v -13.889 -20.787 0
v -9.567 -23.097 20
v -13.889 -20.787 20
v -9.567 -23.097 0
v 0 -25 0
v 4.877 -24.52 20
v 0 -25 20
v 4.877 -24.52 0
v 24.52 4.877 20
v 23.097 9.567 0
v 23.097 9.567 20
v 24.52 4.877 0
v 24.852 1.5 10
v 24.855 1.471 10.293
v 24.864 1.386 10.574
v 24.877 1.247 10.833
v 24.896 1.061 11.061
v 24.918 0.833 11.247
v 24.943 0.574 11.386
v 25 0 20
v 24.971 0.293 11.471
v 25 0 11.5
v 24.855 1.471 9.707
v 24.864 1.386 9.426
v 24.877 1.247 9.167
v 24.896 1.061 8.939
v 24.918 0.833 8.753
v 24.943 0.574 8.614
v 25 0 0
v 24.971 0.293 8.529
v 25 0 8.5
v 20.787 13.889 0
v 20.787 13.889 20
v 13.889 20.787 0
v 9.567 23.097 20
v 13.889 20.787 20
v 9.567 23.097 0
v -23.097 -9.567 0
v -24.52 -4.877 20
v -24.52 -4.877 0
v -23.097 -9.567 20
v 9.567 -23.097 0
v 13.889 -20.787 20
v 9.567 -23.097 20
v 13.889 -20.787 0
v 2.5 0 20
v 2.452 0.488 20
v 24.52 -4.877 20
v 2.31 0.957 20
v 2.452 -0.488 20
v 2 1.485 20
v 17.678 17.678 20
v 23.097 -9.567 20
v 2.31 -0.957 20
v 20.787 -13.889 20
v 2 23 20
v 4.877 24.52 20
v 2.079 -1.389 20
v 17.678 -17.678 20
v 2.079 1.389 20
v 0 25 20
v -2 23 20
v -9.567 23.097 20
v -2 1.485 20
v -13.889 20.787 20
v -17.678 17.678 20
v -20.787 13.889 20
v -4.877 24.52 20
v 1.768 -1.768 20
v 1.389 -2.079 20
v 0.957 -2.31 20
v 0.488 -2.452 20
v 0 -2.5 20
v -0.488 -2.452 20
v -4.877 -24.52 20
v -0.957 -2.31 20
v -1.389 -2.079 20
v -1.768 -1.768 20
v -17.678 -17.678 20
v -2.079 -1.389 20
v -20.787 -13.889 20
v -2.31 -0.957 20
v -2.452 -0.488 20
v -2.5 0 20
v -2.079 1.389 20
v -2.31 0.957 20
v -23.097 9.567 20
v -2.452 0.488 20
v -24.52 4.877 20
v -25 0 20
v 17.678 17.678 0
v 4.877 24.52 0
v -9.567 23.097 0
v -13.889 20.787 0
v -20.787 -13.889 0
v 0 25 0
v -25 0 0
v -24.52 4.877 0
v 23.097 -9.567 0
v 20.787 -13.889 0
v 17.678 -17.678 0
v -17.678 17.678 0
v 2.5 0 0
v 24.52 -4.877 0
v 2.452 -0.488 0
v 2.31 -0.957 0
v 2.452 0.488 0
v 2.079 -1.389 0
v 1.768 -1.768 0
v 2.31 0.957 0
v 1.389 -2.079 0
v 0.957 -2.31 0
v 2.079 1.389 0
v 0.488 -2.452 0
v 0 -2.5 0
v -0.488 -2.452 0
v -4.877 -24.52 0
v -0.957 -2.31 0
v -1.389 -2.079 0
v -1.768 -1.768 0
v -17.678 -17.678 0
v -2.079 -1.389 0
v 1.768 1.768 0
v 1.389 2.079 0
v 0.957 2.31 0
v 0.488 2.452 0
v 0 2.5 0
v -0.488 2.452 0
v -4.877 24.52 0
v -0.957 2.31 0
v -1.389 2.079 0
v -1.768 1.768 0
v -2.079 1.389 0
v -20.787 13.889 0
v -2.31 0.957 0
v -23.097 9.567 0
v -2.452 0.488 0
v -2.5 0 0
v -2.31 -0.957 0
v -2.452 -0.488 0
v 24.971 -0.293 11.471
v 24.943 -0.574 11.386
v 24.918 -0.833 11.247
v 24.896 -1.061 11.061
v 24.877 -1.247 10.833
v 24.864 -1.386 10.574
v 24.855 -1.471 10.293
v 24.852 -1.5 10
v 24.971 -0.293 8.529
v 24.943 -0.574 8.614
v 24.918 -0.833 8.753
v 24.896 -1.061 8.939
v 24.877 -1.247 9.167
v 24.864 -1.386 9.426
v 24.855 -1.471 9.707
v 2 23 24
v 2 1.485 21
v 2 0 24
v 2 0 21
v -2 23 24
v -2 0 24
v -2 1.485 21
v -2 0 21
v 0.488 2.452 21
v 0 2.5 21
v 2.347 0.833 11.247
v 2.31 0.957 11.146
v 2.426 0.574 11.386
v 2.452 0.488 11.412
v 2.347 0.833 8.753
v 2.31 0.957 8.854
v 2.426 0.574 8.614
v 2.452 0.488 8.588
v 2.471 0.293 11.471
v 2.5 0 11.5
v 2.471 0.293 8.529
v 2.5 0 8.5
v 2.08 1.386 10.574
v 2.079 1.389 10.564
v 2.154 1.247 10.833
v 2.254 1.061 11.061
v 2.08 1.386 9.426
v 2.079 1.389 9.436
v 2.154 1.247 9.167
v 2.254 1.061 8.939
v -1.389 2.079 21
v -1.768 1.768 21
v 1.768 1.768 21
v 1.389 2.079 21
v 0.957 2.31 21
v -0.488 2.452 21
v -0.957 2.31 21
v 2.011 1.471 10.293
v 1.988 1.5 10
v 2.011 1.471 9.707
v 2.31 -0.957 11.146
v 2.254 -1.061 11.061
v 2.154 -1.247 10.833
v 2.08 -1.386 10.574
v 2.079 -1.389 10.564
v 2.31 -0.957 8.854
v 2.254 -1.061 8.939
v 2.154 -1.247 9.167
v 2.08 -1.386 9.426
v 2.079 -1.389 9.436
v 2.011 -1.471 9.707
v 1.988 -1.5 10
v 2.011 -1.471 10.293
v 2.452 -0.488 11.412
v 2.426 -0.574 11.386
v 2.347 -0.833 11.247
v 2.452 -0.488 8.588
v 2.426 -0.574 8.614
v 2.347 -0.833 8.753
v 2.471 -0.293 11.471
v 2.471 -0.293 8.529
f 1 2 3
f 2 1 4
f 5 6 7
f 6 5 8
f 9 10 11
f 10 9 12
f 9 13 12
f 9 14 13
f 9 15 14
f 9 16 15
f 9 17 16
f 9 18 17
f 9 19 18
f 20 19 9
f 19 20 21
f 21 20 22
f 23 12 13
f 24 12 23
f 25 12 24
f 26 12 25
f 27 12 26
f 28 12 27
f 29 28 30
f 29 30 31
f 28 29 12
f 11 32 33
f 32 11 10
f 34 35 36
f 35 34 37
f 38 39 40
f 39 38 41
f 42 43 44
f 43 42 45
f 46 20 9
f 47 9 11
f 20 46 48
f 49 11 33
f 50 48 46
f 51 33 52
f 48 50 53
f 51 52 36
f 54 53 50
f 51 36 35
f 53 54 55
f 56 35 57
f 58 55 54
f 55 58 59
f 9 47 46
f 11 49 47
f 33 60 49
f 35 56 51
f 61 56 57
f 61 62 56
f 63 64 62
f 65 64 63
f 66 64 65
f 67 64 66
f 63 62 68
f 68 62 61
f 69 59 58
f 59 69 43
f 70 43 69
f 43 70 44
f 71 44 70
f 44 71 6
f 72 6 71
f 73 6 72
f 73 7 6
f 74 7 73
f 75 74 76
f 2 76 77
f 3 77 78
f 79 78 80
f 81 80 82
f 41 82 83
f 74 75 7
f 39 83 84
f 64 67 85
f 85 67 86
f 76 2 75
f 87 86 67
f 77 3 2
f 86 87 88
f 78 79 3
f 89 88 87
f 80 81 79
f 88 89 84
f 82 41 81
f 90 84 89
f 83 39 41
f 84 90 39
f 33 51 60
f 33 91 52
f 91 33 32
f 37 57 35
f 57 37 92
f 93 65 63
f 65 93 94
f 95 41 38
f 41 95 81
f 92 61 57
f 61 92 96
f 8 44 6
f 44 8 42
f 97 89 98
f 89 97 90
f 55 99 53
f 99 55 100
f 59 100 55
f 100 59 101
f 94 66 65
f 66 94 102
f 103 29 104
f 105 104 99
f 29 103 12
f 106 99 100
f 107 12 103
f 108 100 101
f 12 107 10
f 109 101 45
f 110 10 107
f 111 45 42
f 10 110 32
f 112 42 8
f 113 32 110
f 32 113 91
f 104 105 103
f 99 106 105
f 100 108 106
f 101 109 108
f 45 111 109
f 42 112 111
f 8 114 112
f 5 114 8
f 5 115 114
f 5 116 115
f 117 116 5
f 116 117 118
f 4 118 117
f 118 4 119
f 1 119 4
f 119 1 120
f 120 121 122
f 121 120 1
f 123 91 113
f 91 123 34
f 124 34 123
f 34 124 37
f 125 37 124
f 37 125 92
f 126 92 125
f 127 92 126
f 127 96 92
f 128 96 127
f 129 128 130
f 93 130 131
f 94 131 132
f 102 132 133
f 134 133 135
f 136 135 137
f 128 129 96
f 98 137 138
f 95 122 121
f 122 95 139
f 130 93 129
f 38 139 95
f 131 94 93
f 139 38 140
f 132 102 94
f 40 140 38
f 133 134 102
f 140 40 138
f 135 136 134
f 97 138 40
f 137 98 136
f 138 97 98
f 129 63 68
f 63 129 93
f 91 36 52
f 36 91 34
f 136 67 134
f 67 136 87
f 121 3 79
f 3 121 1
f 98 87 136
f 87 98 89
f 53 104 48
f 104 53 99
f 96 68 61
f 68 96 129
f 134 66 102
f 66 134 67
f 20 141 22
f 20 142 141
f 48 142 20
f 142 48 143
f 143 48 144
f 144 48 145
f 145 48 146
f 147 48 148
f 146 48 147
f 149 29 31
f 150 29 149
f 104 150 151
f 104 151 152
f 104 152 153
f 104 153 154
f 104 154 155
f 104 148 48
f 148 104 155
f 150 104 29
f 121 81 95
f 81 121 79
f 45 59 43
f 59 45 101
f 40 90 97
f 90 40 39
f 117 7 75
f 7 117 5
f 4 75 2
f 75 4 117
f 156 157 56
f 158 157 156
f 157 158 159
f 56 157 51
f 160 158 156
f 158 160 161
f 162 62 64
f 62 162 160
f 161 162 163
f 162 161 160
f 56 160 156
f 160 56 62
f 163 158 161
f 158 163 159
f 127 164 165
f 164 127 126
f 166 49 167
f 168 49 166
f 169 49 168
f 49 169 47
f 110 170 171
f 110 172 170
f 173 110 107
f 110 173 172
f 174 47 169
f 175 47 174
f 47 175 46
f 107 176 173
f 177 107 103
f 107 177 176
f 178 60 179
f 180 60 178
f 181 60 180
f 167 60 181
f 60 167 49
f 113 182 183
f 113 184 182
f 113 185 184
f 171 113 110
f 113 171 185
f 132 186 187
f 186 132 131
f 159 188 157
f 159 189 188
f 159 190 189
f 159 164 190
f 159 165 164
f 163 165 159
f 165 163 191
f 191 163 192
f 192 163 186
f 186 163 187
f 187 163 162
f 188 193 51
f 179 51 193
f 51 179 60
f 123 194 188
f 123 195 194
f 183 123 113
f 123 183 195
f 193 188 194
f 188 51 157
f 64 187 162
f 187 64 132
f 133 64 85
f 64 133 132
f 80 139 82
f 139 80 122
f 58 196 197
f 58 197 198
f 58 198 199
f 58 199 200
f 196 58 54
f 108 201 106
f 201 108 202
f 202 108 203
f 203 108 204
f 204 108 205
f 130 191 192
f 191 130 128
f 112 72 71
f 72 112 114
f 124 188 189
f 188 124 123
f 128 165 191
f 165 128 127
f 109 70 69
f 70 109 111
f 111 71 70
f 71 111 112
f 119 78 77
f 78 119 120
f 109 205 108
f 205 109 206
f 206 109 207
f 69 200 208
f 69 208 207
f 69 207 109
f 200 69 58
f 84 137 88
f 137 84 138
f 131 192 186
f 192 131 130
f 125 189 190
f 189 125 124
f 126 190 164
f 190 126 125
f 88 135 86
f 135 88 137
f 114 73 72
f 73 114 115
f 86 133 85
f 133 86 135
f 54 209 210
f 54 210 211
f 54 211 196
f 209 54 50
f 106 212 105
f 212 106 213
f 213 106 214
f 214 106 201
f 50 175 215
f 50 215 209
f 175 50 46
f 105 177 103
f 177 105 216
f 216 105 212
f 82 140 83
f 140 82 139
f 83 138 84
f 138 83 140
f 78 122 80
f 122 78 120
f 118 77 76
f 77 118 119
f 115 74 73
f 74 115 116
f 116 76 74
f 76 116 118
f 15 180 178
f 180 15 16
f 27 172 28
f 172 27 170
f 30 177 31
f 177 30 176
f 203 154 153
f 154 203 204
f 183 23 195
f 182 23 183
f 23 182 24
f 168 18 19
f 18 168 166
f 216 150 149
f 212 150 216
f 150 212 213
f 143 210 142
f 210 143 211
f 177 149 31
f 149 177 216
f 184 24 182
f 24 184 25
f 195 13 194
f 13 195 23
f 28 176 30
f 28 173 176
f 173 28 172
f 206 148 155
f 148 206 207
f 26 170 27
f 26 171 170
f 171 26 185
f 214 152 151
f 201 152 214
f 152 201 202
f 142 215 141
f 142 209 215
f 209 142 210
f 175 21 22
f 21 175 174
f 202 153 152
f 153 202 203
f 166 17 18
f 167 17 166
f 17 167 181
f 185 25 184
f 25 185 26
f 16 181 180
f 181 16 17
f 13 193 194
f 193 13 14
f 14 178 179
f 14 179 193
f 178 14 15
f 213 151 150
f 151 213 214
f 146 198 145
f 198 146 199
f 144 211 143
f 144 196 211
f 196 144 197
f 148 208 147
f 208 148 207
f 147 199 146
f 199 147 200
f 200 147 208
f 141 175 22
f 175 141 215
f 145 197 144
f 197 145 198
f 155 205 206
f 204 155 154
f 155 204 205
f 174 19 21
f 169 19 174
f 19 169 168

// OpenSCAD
$fn = 32;

// ----------------------------------------------------------------------
// Control knob: pointer knob
// ----------------------------------------------------------------------

// --- parameters (mm) ---
rib_w = 4;                // pointer rib width
rib_h = 5;                // pointer rib height
knob_d = 50;              // knob body diameter
knob_h = 20;              // knob body height
bore_d = 5;               // shaft bore diameter
set_d = 3;                // set screw bore diameter

rib_poke = rib_h - 1;  // rib height above the top
total_h = knob_h + rib_h - 1;  // overall height

difference() {
  union() {
    cylinder(h = knob_h, d = knob_d);
    translate([-rib_w / 2, 0, knob_h - 1])
      cube([rib_w, knob_d / 2 - 2, rib_h]);
  }
  translate([0, 0, -1]) cylinder(h = knob_h + 2, d = bore_d);
  translate([-1, 0, knob_h / 2]) rotate([0, 90, 0])
    cylinder(h = knob_d / 2 + bore_d / 2 + 2, d = set_d);}
